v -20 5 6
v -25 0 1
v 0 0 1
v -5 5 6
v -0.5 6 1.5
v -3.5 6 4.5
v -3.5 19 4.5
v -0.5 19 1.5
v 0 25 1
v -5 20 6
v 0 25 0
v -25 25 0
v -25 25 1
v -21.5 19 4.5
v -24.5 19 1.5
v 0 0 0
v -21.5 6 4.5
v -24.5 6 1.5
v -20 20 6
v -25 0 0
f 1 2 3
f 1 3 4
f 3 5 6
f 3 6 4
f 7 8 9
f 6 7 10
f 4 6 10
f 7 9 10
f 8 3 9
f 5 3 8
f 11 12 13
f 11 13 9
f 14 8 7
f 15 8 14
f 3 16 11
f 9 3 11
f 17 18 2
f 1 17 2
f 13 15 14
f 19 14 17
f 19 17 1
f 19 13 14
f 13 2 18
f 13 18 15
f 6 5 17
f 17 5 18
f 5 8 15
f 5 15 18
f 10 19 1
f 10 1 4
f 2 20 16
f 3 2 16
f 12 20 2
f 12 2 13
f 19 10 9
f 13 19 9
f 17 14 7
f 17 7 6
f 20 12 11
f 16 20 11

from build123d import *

# Parameters (mm, degrees)
F0_W        = 25
F0_H        = 25
F1_DEPTH    = 6
F2_W        = 13
F2_H        = 3
F3_DEPTH    = 25
F4_T1_DEPTH = 50.7168298797
F4_T3_DEPTH = 50.7168298797


# Not quite as in the source:
# - a fillet or chamfer that OpenCascade refuses, or shapes differently, is made with other operations: its cross-section is extruded or revolved along the edge and cut away or added


with BuildPart() as f1:
    # F0 (on Top) → F1 (new body)
    with BuildSketch(Plane.XY):
        with Locations((-12.5, 12.5)):
            Rectangle(F0_W, F0_H)
    extrude(amount=F1_DEPTH)

    # F2 (on face) → F3 (cut)
    with BuildSketch(Plane(origin=(-25, 0, 0), x_dir=(0, -1, 0), z_dir=(-1, 0, 0))):
        with Locations((-12.5, 3)):
            Rectangle(F2_W, F2_H)
    extrude(amount=-F3_DEPTH, mode=Mode.SUBTRACT)

    # F4: chamfer of 5 on 4 edges, made by hand

    # F4_s2 → F4_t1 (cut)
    with BuildSketch(Plane.YZ.offset(-37.8584149398)):
        Polygon((0, 1), (5, 6), (0, 6), align=None)
        Polygon((20, 6), (25, 1), (25, 6), align=None)
    extrude(amount=F4_T1_DEPTH, mode=Mode.SUBTRACT)

    # F4_s4 → F4_t3 (cut)
    with BuildSketch(Plane.XZ.offset(-37.8584149398)):
        Polygon((-25, 1), (-20, 6), (-25, 6), align=None)
        Polygon((0, 1), (-5, 6), (0, 6), align=None)
    extrude(amount=F4_T3_DEPTH, mode=Mode.SUBTRACT)


solid = f1.part
